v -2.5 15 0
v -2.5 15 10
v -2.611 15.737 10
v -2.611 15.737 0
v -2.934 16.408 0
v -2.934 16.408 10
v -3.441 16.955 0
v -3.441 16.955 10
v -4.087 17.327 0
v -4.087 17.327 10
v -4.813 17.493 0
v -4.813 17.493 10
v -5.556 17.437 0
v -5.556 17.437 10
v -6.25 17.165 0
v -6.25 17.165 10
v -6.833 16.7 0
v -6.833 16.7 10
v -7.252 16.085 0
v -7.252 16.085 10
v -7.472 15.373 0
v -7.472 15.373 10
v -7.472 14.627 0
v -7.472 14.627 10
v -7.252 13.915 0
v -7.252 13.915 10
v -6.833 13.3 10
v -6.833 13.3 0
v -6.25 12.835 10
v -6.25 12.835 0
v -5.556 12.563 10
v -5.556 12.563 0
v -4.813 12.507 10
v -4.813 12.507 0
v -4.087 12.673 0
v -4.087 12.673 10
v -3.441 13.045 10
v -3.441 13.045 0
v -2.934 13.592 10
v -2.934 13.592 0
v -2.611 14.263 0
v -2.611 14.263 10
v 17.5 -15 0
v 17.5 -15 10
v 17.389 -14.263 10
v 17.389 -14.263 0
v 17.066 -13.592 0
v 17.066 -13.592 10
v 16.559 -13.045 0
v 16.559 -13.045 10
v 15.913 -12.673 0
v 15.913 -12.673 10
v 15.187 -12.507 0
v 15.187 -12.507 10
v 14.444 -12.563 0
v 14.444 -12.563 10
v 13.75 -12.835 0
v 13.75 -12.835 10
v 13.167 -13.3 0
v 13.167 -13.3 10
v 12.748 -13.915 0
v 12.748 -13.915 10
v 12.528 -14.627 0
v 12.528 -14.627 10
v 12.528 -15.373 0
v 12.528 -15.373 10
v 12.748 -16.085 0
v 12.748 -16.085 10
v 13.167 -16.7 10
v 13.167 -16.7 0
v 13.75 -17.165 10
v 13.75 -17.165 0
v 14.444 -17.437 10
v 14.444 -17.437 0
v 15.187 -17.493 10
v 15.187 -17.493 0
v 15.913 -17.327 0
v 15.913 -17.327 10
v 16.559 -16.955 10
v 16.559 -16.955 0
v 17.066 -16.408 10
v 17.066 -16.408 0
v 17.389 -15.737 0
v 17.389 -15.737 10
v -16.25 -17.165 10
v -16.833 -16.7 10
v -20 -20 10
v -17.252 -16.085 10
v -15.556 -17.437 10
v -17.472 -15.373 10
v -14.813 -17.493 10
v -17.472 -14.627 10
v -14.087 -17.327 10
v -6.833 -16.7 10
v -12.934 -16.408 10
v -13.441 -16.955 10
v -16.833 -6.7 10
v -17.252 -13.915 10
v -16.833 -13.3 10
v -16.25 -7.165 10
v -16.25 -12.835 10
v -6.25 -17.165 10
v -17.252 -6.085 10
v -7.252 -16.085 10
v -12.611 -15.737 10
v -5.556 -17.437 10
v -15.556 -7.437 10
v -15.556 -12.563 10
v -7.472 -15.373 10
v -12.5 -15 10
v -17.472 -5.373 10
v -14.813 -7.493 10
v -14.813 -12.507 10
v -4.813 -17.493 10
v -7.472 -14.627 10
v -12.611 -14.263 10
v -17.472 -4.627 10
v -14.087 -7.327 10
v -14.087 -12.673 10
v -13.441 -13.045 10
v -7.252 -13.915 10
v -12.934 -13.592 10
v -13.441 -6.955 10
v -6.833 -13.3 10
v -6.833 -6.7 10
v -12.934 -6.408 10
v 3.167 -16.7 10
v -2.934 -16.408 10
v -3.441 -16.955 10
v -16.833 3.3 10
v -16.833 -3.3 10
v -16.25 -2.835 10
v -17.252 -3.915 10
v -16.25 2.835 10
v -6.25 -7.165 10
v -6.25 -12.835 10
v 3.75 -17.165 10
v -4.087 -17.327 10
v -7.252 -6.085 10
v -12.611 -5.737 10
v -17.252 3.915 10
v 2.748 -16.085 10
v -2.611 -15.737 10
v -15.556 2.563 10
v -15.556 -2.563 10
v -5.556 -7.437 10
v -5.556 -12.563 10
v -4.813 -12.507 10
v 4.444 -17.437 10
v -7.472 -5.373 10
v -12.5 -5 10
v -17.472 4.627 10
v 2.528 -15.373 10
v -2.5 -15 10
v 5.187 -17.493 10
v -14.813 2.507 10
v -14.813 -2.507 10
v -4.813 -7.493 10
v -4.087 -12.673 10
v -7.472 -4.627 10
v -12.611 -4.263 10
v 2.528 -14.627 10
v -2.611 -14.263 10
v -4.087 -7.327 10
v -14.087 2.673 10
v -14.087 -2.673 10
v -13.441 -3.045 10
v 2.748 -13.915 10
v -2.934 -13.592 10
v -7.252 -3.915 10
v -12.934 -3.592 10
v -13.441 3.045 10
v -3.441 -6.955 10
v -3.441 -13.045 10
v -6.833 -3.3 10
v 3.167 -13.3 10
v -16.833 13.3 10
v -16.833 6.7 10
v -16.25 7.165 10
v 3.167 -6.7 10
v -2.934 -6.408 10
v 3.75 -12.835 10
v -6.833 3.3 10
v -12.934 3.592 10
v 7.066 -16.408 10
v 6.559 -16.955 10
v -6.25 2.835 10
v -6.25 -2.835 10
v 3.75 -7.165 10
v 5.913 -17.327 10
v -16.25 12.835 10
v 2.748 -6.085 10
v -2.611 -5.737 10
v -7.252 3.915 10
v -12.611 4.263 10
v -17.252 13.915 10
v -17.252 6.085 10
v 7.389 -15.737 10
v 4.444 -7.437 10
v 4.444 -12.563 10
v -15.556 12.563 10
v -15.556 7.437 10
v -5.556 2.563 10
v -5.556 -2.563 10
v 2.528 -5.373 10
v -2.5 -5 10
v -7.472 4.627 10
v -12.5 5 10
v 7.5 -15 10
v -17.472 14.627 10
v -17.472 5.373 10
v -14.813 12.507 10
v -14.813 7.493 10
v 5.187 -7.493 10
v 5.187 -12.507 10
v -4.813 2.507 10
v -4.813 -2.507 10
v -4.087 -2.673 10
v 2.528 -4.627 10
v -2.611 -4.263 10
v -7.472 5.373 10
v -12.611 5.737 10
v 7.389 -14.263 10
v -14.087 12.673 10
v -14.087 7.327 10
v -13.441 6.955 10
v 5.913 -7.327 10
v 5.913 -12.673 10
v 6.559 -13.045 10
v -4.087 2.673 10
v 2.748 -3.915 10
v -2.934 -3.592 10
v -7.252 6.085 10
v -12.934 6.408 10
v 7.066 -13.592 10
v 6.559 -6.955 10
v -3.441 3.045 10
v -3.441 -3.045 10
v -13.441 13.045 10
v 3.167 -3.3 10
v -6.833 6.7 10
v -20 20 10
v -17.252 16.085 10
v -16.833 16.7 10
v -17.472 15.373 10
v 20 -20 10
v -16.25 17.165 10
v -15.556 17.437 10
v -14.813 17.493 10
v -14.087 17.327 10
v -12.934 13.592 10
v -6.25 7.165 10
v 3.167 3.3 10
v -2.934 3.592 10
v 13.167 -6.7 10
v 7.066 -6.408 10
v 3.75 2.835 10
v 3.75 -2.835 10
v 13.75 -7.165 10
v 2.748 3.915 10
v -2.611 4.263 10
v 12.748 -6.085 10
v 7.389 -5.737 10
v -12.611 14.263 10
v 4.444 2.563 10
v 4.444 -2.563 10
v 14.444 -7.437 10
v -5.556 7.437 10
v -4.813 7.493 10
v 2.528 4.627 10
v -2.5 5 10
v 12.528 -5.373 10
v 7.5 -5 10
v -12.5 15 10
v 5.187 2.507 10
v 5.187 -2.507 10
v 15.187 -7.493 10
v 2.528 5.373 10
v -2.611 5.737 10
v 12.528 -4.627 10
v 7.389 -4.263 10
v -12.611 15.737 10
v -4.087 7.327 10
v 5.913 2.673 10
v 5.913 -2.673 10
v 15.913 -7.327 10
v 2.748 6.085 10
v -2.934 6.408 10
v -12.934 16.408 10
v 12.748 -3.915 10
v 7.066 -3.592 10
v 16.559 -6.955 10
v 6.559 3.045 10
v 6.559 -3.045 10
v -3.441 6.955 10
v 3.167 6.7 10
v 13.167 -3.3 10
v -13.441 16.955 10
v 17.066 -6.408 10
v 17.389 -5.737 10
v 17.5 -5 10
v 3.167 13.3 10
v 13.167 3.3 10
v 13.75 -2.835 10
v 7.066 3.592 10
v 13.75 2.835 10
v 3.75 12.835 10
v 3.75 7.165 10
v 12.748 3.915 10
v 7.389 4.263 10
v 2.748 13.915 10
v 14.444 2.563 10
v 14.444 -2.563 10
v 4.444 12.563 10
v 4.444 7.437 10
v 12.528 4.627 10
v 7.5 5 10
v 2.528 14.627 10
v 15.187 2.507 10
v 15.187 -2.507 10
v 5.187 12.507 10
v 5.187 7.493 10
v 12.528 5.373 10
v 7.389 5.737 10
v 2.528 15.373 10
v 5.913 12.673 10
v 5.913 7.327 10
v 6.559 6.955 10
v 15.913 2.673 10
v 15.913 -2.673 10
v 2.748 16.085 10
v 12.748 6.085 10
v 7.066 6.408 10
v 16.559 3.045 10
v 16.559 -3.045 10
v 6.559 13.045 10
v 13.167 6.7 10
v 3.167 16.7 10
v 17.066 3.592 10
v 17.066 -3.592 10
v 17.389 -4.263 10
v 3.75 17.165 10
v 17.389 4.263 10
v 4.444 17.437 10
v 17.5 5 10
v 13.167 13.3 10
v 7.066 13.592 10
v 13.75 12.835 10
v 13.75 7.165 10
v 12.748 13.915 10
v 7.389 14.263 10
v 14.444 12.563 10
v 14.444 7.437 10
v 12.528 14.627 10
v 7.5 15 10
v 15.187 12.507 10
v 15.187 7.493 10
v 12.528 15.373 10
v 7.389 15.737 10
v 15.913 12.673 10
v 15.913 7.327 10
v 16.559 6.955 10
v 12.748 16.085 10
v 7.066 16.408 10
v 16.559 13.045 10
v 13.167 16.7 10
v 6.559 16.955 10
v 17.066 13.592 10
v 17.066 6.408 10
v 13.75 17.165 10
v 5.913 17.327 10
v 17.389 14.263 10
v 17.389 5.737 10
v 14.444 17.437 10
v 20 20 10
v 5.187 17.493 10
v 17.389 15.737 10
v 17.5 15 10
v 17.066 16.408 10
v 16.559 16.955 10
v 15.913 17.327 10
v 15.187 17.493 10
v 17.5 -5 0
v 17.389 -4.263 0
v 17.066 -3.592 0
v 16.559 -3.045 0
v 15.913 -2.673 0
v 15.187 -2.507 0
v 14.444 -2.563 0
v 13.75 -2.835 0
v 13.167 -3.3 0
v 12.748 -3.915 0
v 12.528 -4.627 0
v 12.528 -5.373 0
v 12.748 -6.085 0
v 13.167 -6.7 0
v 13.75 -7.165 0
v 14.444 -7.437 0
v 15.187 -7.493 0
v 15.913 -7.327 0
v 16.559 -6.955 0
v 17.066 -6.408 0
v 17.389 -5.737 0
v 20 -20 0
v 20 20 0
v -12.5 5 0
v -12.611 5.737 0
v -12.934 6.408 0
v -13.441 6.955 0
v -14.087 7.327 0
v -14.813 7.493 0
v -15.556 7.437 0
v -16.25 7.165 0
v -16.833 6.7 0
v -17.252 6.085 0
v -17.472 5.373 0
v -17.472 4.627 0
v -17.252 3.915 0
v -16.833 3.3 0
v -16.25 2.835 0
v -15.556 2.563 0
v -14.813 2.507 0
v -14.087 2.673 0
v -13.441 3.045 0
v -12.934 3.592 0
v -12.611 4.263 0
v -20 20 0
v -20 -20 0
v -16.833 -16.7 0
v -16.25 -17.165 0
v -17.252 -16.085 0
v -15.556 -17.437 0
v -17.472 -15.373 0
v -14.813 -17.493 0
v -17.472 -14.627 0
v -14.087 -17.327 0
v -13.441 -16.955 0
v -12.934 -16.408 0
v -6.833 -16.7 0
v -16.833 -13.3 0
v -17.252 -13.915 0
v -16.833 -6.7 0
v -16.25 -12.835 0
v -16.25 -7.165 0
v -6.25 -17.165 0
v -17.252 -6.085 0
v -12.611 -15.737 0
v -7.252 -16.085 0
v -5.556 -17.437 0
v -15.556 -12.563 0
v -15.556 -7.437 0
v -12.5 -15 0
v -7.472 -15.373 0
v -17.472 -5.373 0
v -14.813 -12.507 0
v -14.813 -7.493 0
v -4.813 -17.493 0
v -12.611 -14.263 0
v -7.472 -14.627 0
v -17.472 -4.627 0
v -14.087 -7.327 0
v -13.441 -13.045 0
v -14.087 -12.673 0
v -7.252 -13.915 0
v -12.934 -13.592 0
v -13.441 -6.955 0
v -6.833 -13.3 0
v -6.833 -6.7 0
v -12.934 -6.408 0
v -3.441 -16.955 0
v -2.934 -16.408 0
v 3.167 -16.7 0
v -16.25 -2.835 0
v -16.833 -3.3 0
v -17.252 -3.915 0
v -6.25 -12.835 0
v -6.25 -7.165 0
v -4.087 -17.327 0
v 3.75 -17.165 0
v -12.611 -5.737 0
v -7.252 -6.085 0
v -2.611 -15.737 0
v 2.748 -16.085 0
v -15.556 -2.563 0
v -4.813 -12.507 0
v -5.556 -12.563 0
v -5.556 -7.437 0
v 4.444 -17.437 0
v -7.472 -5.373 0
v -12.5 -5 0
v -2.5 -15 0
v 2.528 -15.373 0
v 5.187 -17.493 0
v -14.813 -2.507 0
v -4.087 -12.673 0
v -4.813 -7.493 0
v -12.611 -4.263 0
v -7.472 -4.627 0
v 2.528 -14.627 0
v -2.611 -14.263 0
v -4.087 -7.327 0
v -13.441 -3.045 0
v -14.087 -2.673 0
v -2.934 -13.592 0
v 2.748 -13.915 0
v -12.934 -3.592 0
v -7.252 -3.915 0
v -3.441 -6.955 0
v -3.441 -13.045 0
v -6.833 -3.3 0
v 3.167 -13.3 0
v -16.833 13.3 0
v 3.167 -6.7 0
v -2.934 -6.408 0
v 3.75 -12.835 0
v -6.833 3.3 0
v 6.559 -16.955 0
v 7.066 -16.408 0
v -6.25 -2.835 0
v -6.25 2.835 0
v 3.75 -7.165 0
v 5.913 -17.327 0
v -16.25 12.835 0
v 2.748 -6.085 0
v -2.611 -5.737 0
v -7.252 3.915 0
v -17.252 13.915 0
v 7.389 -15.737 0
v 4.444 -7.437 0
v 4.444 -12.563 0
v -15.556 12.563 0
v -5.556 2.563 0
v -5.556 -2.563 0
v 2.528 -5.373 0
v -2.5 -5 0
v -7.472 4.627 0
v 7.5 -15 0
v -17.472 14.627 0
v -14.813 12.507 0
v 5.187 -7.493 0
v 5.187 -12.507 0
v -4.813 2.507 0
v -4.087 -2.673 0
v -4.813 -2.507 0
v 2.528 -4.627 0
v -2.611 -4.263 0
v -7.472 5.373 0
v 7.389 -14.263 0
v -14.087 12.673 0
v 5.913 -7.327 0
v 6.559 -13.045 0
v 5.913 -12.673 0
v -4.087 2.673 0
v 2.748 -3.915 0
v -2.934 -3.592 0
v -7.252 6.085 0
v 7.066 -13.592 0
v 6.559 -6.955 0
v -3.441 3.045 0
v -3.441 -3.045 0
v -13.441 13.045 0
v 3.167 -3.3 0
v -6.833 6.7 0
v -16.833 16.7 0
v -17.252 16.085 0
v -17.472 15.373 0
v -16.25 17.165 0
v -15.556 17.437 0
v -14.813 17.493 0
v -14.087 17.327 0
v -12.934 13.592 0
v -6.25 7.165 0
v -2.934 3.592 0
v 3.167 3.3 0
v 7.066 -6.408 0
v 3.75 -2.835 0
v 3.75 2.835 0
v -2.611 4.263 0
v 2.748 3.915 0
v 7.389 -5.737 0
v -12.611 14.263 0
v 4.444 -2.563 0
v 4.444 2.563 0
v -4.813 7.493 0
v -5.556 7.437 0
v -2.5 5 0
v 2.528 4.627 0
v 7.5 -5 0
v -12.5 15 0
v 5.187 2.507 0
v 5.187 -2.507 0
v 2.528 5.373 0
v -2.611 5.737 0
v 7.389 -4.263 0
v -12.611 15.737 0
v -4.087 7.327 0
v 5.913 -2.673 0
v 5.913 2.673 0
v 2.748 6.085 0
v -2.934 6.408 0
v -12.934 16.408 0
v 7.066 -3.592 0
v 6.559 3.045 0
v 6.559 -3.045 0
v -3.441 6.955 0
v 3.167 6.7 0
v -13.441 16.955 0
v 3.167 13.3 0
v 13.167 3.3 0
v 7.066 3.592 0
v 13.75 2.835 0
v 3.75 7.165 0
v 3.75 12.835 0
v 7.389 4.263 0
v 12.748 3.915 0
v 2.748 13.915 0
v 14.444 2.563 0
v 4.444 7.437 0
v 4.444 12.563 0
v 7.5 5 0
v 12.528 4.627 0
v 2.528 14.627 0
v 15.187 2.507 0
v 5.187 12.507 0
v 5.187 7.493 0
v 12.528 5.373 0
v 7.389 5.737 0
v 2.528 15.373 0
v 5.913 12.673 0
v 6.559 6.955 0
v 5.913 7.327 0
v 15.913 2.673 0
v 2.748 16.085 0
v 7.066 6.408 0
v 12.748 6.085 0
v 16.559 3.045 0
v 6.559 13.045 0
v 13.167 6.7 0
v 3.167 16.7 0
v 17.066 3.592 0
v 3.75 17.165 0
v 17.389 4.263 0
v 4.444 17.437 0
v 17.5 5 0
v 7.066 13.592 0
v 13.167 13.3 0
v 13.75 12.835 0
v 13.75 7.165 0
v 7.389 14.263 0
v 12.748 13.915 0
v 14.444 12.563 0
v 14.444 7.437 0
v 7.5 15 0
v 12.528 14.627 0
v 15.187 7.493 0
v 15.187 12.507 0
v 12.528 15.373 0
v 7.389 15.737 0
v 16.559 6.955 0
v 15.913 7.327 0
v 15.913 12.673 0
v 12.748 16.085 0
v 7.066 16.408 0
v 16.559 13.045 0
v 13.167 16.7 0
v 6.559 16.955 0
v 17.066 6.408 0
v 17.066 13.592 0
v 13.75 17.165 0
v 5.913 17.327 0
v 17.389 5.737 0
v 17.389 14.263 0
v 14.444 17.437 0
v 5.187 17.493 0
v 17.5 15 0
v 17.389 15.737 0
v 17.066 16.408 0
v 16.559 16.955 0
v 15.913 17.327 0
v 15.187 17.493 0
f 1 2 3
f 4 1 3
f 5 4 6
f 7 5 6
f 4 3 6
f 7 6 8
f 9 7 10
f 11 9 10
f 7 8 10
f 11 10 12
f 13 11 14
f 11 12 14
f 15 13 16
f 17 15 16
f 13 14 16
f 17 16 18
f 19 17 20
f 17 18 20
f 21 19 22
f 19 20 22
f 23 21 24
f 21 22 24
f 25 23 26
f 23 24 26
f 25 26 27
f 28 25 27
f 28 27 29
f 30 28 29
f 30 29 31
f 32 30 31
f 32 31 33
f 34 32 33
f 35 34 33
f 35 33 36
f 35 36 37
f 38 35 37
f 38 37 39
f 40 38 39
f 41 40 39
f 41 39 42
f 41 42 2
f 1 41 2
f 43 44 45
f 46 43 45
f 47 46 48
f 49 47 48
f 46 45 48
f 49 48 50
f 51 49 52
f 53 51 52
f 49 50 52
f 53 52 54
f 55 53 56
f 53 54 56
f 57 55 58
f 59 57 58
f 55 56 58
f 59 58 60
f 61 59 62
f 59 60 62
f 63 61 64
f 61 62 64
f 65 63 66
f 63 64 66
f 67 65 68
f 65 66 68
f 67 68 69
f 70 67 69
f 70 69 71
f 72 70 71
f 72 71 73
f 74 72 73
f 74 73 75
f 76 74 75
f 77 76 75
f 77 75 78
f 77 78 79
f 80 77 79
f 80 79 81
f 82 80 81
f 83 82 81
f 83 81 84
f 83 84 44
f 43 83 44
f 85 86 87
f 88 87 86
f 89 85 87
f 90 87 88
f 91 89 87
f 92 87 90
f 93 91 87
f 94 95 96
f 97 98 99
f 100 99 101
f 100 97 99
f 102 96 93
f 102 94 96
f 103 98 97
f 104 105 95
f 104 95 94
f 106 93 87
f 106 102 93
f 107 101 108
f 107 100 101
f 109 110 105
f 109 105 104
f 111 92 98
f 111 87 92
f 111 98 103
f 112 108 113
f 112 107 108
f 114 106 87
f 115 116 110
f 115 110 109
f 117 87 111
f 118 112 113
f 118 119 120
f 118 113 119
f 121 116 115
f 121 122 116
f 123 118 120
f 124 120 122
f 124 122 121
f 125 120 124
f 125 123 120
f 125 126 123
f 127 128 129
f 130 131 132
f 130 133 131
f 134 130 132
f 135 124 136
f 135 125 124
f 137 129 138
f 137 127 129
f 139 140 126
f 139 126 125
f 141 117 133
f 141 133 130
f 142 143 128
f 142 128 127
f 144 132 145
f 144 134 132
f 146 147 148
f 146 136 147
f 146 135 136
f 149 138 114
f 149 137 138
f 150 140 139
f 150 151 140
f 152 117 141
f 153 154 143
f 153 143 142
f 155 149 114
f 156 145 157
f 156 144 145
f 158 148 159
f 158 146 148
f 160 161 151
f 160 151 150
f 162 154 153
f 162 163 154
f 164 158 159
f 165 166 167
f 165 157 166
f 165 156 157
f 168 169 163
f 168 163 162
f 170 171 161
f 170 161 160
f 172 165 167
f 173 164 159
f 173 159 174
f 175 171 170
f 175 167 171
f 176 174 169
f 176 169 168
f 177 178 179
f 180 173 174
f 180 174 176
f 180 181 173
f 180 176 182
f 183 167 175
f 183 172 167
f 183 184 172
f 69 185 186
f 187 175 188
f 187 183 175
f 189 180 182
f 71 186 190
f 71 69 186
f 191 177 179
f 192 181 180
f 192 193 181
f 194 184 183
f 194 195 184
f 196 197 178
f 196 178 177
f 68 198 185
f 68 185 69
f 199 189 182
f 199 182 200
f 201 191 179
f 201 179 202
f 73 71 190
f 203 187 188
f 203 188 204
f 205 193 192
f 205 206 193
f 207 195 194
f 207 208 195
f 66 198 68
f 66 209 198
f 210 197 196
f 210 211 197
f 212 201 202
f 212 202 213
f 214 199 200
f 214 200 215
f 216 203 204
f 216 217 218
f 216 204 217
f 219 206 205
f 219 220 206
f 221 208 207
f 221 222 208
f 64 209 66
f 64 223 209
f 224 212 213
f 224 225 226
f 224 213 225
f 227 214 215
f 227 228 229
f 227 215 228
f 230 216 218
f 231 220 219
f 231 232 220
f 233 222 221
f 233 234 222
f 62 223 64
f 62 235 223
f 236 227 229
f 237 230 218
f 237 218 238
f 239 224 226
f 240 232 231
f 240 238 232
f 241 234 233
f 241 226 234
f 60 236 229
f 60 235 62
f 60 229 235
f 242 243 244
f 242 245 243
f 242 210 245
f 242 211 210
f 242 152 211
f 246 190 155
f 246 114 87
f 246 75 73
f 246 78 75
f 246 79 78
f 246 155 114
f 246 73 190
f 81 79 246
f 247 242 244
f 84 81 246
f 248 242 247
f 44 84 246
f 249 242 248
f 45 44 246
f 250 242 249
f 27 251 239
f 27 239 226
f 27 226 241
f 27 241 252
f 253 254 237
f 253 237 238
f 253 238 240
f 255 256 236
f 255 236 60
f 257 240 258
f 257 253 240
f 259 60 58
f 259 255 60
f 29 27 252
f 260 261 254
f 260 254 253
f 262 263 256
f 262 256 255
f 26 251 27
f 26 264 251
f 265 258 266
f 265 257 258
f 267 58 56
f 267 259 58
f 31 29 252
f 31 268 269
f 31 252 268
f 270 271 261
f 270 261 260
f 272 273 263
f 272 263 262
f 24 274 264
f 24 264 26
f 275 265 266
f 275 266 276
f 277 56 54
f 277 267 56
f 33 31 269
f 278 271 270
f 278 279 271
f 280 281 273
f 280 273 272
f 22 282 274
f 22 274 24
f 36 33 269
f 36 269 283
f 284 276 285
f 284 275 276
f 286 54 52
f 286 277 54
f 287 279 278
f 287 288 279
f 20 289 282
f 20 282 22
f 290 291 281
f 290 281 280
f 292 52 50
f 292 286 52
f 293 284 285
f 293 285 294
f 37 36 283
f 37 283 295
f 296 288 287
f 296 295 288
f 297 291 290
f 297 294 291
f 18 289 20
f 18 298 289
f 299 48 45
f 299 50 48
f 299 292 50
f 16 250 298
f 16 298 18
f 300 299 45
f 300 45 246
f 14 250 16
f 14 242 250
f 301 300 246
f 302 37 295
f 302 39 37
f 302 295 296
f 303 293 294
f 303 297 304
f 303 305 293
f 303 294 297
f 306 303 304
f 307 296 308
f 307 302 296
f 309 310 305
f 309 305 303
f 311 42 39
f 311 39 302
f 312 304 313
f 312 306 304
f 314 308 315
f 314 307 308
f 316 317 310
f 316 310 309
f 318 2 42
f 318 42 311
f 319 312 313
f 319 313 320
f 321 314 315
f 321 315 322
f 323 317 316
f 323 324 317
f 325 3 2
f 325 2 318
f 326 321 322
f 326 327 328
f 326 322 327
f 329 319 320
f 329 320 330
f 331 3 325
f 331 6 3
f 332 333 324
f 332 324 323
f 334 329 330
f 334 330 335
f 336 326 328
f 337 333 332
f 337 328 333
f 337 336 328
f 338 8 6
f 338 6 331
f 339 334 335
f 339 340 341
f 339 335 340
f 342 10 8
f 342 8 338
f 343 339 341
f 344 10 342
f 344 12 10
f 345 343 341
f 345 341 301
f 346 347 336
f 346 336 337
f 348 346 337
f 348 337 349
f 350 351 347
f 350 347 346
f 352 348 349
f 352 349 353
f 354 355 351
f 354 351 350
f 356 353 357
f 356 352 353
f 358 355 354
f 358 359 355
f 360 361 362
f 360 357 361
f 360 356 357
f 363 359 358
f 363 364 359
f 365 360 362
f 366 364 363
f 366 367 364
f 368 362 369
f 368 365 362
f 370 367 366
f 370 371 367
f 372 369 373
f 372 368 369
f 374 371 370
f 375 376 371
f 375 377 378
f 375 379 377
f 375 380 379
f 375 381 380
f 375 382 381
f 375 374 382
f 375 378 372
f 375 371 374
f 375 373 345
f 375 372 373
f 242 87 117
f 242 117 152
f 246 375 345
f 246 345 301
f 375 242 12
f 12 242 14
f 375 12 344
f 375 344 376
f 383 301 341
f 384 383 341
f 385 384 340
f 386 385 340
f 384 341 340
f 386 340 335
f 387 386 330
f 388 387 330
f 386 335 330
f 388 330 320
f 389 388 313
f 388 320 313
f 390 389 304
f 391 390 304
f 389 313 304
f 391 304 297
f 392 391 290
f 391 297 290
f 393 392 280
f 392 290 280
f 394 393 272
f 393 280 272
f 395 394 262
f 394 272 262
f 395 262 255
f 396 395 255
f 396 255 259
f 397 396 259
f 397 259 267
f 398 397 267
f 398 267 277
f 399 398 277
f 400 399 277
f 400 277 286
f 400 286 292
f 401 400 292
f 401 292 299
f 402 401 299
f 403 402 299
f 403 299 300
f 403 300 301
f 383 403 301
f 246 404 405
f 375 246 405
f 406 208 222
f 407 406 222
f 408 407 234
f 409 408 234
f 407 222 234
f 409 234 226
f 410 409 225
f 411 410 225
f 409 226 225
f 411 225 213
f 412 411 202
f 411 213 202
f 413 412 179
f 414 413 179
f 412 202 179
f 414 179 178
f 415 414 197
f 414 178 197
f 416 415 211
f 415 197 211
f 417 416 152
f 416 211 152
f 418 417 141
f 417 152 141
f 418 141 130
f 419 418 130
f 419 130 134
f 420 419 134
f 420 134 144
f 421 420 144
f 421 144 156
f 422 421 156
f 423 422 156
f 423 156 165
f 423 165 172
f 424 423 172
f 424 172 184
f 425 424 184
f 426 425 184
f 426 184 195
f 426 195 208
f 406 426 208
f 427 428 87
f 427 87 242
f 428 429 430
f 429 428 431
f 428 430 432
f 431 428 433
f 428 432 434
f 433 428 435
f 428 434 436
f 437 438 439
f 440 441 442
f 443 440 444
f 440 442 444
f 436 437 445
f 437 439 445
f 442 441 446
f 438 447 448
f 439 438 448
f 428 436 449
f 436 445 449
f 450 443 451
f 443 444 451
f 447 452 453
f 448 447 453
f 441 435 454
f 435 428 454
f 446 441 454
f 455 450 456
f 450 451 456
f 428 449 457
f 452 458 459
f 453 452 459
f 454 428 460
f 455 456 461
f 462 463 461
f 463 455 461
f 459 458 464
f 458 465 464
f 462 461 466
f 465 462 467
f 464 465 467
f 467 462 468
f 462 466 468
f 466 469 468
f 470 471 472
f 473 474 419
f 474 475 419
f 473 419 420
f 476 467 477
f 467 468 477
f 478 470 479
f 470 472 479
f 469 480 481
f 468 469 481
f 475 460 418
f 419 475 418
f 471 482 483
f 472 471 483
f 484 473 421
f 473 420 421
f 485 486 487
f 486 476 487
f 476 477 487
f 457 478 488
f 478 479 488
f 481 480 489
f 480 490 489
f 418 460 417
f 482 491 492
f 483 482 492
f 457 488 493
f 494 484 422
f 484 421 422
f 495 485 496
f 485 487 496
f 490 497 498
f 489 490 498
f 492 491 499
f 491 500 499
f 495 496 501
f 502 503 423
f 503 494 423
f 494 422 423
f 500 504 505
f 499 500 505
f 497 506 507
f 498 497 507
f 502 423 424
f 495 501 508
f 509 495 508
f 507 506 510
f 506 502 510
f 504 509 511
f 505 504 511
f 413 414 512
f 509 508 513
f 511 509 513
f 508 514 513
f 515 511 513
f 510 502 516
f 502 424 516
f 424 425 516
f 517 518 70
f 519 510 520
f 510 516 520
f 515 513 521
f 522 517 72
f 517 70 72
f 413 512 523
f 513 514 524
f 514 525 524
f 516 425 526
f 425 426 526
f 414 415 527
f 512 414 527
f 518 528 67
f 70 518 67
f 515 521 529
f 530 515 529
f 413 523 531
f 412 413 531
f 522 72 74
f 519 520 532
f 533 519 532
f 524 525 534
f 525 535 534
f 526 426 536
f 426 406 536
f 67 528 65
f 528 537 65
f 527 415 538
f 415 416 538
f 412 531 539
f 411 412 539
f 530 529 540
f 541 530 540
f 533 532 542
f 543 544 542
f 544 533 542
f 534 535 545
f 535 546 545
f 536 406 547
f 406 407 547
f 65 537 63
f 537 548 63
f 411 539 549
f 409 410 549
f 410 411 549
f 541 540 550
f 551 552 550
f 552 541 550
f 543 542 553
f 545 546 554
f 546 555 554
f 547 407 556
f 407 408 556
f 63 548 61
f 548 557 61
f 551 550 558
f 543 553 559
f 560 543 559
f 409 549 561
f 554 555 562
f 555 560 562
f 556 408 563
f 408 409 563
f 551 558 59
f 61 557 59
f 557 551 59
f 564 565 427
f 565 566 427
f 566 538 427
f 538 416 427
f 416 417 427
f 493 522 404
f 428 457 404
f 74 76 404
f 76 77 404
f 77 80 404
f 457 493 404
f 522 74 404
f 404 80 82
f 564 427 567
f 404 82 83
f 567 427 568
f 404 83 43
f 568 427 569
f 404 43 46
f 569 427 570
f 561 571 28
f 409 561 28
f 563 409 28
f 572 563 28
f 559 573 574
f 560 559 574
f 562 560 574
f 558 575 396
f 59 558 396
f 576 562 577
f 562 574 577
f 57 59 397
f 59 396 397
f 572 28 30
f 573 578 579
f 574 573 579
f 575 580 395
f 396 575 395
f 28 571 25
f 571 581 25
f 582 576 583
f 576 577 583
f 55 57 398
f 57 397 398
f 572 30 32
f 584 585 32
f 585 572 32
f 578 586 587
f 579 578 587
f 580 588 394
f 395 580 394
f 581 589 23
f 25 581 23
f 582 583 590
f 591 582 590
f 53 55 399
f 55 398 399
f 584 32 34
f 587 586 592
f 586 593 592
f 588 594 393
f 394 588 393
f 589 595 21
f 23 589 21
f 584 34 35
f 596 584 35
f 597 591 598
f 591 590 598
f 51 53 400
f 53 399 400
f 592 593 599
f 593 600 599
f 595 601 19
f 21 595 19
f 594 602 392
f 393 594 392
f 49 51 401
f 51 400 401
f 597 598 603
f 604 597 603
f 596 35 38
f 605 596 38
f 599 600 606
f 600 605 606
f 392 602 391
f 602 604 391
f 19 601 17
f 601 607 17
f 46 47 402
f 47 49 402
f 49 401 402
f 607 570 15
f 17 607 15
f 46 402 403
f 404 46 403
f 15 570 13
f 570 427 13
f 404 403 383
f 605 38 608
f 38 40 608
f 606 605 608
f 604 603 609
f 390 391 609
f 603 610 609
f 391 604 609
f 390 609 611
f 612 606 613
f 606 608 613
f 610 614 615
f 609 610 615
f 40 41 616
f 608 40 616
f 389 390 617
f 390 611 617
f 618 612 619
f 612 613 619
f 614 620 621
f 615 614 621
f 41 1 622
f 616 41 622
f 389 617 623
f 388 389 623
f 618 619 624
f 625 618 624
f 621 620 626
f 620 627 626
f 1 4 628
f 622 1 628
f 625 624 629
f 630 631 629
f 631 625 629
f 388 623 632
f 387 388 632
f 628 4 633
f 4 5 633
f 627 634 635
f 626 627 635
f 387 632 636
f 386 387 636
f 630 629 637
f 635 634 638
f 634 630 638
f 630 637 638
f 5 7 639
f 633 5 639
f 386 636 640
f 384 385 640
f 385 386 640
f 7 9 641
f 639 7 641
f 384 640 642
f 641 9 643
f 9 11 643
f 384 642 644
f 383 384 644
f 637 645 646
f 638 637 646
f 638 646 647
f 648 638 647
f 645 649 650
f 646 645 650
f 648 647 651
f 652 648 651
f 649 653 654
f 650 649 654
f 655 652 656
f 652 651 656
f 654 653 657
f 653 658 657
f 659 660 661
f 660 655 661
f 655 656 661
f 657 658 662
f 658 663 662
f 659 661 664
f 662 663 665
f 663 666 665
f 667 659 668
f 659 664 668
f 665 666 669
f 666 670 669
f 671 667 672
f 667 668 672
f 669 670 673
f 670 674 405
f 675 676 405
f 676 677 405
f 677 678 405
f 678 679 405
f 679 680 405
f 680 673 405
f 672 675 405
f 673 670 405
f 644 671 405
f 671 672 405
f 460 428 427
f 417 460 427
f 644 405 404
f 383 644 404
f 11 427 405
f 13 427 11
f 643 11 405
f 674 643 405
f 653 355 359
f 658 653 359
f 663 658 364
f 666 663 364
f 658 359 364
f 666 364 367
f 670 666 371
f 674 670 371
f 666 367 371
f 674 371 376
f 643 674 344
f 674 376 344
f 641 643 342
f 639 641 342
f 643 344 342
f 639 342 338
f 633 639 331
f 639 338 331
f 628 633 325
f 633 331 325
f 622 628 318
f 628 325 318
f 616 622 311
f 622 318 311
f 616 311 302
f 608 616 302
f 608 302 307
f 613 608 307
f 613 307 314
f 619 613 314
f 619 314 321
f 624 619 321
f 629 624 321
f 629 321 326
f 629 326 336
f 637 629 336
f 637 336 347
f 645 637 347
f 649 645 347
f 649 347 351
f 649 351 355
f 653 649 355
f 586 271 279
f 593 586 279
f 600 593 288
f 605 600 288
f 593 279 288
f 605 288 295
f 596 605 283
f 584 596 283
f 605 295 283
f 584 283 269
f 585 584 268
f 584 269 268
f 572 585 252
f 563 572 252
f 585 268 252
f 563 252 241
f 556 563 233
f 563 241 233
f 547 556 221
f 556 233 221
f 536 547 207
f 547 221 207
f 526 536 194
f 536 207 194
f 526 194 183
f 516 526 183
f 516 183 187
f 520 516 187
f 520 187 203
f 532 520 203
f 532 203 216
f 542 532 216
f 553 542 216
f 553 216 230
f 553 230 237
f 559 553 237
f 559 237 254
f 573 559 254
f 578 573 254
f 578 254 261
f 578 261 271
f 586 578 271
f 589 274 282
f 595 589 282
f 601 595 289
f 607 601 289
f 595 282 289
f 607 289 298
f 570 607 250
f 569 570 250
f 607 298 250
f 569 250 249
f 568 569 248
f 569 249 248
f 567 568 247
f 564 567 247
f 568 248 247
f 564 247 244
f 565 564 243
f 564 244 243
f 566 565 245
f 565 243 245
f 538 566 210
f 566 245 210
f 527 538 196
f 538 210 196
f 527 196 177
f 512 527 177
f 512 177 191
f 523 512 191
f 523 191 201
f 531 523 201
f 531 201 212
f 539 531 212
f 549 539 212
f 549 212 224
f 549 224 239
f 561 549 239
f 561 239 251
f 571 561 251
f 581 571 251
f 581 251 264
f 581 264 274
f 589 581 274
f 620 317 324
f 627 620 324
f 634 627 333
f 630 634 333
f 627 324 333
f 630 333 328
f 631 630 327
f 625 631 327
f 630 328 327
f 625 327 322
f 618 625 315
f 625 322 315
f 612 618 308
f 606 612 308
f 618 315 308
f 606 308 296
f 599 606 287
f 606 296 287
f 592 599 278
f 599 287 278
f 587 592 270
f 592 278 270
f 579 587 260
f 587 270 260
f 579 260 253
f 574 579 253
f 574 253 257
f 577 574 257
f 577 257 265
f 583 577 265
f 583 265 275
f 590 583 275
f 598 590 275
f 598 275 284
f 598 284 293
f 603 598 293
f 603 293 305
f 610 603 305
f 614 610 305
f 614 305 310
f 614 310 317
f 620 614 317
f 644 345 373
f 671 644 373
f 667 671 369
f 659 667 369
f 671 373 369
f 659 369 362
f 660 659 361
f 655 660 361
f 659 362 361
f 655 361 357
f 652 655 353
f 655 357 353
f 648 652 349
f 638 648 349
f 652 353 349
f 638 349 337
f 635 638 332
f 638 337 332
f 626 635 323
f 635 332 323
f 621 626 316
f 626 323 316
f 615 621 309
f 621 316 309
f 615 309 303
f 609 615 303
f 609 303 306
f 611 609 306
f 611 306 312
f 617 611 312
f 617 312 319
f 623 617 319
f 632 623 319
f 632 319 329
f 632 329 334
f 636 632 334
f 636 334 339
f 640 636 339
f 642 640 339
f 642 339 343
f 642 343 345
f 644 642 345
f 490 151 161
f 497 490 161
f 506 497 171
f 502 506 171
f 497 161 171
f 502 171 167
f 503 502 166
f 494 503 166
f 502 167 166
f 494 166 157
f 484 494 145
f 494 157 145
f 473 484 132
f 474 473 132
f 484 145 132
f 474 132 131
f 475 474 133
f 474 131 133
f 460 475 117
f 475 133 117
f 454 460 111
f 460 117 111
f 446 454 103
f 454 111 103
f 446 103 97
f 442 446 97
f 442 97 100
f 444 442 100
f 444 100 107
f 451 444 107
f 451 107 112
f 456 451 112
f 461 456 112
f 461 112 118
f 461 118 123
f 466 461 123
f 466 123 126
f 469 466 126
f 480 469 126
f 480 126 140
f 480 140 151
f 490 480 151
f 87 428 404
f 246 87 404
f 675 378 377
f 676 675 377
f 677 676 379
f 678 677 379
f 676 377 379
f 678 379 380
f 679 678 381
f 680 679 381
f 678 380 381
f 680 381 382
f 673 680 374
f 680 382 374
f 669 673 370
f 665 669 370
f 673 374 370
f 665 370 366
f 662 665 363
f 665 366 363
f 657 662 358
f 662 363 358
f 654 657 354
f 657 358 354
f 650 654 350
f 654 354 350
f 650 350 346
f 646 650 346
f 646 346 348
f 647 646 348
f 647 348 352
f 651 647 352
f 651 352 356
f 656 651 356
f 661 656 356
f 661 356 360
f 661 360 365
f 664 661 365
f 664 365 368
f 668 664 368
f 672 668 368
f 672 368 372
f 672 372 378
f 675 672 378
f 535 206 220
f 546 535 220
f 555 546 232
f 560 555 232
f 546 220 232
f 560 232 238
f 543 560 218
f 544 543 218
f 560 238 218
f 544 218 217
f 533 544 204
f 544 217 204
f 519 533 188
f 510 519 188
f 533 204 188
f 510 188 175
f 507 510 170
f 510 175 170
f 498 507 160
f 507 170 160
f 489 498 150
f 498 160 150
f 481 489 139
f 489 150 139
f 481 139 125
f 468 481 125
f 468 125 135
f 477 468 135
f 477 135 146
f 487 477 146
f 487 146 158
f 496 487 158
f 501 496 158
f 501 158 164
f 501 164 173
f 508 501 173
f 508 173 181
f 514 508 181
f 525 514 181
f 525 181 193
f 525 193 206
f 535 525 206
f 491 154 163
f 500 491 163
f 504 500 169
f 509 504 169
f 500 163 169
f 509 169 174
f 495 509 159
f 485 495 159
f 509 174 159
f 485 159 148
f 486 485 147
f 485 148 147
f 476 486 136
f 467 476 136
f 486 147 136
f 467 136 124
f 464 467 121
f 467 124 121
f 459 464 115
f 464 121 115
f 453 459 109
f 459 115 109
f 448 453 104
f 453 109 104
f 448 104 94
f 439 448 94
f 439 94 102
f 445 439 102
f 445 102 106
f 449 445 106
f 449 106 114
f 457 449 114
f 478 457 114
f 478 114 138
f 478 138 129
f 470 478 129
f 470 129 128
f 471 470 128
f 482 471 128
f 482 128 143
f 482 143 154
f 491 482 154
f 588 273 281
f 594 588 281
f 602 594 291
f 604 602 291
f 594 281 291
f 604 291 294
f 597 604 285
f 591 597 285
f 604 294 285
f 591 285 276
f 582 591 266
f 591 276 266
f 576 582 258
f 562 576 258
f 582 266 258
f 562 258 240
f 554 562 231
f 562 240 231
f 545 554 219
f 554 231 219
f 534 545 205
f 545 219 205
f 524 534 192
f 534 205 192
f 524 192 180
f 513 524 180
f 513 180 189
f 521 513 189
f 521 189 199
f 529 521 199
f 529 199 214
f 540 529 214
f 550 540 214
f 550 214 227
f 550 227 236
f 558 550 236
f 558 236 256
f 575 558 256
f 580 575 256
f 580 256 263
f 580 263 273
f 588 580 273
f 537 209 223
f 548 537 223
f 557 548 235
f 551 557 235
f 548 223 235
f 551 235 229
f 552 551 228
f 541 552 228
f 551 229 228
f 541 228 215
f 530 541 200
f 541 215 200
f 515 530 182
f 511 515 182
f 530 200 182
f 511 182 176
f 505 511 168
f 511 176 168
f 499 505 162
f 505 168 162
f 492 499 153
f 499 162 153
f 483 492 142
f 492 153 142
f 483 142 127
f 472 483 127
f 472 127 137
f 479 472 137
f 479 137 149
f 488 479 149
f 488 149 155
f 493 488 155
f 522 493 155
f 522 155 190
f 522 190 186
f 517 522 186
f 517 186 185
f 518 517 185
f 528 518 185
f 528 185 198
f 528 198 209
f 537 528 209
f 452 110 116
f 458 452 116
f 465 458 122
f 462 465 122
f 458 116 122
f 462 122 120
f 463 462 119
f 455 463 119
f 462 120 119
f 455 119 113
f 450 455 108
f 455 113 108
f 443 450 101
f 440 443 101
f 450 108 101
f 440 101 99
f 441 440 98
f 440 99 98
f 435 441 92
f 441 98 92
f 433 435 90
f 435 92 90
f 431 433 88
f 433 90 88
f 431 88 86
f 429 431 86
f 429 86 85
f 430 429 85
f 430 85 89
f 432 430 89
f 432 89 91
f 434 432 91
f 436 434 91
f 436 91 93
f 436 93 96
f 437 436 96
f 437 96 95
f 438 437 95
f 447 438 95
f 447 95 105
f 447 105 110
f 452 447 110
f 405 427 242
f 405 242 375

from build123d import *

# Parameters (mm, degrees)
SKETCH1_W            = 40
SKETCH1_H            = 40
BOSS_EXTRUDE1_DEPTH  = 10
SKETCH3_R            = 2.5
CUT_EXTRUDE1_DEPTH   = 11
LPATTERN1_COUNT      = 4
LPATTERN1_PITCH      = 10
LPATTERN1_COUNT_DIR2 = 4
LPATTERN1_PITCH_DIR2 = 10


with BuildPart() as part:
    # Sketch1 → Boss-Extrude1 (new body)
    with BuildSketch(Plane.XY):
        Rectangle(SKETCH1_W, SKETCH1_H)
    extrude(amount=BOSS_EXTRUDE1_DEPTH)

    # Sketch3 → Cut-Extrude1 (cut, through all)
    with BuildSketch(Plane.XY.offset(10)):
        with Locations((15, 15)):
            Circle(SKETCH3_R)
    cut_extrude1 = extrude(amount=-CUT_EXTRUDE1_DEPTH, mode=Mode.SUBTRACT)

    # LPattern1: Cut-Extrude1 4 × 4
    with Locations(*[(-i * LPATTERN1_PITCH, -j * LPATTERN1_PITCH_DIR2, 0) for i in range(LPATTERN1_COUNT) for j in range(LPATTERN1_COUNT_DIR2) if (i, j) != (0, 0)]):
        add(cut_extrude1, mode=Mode.SUBTRACT)


solid = part.part
